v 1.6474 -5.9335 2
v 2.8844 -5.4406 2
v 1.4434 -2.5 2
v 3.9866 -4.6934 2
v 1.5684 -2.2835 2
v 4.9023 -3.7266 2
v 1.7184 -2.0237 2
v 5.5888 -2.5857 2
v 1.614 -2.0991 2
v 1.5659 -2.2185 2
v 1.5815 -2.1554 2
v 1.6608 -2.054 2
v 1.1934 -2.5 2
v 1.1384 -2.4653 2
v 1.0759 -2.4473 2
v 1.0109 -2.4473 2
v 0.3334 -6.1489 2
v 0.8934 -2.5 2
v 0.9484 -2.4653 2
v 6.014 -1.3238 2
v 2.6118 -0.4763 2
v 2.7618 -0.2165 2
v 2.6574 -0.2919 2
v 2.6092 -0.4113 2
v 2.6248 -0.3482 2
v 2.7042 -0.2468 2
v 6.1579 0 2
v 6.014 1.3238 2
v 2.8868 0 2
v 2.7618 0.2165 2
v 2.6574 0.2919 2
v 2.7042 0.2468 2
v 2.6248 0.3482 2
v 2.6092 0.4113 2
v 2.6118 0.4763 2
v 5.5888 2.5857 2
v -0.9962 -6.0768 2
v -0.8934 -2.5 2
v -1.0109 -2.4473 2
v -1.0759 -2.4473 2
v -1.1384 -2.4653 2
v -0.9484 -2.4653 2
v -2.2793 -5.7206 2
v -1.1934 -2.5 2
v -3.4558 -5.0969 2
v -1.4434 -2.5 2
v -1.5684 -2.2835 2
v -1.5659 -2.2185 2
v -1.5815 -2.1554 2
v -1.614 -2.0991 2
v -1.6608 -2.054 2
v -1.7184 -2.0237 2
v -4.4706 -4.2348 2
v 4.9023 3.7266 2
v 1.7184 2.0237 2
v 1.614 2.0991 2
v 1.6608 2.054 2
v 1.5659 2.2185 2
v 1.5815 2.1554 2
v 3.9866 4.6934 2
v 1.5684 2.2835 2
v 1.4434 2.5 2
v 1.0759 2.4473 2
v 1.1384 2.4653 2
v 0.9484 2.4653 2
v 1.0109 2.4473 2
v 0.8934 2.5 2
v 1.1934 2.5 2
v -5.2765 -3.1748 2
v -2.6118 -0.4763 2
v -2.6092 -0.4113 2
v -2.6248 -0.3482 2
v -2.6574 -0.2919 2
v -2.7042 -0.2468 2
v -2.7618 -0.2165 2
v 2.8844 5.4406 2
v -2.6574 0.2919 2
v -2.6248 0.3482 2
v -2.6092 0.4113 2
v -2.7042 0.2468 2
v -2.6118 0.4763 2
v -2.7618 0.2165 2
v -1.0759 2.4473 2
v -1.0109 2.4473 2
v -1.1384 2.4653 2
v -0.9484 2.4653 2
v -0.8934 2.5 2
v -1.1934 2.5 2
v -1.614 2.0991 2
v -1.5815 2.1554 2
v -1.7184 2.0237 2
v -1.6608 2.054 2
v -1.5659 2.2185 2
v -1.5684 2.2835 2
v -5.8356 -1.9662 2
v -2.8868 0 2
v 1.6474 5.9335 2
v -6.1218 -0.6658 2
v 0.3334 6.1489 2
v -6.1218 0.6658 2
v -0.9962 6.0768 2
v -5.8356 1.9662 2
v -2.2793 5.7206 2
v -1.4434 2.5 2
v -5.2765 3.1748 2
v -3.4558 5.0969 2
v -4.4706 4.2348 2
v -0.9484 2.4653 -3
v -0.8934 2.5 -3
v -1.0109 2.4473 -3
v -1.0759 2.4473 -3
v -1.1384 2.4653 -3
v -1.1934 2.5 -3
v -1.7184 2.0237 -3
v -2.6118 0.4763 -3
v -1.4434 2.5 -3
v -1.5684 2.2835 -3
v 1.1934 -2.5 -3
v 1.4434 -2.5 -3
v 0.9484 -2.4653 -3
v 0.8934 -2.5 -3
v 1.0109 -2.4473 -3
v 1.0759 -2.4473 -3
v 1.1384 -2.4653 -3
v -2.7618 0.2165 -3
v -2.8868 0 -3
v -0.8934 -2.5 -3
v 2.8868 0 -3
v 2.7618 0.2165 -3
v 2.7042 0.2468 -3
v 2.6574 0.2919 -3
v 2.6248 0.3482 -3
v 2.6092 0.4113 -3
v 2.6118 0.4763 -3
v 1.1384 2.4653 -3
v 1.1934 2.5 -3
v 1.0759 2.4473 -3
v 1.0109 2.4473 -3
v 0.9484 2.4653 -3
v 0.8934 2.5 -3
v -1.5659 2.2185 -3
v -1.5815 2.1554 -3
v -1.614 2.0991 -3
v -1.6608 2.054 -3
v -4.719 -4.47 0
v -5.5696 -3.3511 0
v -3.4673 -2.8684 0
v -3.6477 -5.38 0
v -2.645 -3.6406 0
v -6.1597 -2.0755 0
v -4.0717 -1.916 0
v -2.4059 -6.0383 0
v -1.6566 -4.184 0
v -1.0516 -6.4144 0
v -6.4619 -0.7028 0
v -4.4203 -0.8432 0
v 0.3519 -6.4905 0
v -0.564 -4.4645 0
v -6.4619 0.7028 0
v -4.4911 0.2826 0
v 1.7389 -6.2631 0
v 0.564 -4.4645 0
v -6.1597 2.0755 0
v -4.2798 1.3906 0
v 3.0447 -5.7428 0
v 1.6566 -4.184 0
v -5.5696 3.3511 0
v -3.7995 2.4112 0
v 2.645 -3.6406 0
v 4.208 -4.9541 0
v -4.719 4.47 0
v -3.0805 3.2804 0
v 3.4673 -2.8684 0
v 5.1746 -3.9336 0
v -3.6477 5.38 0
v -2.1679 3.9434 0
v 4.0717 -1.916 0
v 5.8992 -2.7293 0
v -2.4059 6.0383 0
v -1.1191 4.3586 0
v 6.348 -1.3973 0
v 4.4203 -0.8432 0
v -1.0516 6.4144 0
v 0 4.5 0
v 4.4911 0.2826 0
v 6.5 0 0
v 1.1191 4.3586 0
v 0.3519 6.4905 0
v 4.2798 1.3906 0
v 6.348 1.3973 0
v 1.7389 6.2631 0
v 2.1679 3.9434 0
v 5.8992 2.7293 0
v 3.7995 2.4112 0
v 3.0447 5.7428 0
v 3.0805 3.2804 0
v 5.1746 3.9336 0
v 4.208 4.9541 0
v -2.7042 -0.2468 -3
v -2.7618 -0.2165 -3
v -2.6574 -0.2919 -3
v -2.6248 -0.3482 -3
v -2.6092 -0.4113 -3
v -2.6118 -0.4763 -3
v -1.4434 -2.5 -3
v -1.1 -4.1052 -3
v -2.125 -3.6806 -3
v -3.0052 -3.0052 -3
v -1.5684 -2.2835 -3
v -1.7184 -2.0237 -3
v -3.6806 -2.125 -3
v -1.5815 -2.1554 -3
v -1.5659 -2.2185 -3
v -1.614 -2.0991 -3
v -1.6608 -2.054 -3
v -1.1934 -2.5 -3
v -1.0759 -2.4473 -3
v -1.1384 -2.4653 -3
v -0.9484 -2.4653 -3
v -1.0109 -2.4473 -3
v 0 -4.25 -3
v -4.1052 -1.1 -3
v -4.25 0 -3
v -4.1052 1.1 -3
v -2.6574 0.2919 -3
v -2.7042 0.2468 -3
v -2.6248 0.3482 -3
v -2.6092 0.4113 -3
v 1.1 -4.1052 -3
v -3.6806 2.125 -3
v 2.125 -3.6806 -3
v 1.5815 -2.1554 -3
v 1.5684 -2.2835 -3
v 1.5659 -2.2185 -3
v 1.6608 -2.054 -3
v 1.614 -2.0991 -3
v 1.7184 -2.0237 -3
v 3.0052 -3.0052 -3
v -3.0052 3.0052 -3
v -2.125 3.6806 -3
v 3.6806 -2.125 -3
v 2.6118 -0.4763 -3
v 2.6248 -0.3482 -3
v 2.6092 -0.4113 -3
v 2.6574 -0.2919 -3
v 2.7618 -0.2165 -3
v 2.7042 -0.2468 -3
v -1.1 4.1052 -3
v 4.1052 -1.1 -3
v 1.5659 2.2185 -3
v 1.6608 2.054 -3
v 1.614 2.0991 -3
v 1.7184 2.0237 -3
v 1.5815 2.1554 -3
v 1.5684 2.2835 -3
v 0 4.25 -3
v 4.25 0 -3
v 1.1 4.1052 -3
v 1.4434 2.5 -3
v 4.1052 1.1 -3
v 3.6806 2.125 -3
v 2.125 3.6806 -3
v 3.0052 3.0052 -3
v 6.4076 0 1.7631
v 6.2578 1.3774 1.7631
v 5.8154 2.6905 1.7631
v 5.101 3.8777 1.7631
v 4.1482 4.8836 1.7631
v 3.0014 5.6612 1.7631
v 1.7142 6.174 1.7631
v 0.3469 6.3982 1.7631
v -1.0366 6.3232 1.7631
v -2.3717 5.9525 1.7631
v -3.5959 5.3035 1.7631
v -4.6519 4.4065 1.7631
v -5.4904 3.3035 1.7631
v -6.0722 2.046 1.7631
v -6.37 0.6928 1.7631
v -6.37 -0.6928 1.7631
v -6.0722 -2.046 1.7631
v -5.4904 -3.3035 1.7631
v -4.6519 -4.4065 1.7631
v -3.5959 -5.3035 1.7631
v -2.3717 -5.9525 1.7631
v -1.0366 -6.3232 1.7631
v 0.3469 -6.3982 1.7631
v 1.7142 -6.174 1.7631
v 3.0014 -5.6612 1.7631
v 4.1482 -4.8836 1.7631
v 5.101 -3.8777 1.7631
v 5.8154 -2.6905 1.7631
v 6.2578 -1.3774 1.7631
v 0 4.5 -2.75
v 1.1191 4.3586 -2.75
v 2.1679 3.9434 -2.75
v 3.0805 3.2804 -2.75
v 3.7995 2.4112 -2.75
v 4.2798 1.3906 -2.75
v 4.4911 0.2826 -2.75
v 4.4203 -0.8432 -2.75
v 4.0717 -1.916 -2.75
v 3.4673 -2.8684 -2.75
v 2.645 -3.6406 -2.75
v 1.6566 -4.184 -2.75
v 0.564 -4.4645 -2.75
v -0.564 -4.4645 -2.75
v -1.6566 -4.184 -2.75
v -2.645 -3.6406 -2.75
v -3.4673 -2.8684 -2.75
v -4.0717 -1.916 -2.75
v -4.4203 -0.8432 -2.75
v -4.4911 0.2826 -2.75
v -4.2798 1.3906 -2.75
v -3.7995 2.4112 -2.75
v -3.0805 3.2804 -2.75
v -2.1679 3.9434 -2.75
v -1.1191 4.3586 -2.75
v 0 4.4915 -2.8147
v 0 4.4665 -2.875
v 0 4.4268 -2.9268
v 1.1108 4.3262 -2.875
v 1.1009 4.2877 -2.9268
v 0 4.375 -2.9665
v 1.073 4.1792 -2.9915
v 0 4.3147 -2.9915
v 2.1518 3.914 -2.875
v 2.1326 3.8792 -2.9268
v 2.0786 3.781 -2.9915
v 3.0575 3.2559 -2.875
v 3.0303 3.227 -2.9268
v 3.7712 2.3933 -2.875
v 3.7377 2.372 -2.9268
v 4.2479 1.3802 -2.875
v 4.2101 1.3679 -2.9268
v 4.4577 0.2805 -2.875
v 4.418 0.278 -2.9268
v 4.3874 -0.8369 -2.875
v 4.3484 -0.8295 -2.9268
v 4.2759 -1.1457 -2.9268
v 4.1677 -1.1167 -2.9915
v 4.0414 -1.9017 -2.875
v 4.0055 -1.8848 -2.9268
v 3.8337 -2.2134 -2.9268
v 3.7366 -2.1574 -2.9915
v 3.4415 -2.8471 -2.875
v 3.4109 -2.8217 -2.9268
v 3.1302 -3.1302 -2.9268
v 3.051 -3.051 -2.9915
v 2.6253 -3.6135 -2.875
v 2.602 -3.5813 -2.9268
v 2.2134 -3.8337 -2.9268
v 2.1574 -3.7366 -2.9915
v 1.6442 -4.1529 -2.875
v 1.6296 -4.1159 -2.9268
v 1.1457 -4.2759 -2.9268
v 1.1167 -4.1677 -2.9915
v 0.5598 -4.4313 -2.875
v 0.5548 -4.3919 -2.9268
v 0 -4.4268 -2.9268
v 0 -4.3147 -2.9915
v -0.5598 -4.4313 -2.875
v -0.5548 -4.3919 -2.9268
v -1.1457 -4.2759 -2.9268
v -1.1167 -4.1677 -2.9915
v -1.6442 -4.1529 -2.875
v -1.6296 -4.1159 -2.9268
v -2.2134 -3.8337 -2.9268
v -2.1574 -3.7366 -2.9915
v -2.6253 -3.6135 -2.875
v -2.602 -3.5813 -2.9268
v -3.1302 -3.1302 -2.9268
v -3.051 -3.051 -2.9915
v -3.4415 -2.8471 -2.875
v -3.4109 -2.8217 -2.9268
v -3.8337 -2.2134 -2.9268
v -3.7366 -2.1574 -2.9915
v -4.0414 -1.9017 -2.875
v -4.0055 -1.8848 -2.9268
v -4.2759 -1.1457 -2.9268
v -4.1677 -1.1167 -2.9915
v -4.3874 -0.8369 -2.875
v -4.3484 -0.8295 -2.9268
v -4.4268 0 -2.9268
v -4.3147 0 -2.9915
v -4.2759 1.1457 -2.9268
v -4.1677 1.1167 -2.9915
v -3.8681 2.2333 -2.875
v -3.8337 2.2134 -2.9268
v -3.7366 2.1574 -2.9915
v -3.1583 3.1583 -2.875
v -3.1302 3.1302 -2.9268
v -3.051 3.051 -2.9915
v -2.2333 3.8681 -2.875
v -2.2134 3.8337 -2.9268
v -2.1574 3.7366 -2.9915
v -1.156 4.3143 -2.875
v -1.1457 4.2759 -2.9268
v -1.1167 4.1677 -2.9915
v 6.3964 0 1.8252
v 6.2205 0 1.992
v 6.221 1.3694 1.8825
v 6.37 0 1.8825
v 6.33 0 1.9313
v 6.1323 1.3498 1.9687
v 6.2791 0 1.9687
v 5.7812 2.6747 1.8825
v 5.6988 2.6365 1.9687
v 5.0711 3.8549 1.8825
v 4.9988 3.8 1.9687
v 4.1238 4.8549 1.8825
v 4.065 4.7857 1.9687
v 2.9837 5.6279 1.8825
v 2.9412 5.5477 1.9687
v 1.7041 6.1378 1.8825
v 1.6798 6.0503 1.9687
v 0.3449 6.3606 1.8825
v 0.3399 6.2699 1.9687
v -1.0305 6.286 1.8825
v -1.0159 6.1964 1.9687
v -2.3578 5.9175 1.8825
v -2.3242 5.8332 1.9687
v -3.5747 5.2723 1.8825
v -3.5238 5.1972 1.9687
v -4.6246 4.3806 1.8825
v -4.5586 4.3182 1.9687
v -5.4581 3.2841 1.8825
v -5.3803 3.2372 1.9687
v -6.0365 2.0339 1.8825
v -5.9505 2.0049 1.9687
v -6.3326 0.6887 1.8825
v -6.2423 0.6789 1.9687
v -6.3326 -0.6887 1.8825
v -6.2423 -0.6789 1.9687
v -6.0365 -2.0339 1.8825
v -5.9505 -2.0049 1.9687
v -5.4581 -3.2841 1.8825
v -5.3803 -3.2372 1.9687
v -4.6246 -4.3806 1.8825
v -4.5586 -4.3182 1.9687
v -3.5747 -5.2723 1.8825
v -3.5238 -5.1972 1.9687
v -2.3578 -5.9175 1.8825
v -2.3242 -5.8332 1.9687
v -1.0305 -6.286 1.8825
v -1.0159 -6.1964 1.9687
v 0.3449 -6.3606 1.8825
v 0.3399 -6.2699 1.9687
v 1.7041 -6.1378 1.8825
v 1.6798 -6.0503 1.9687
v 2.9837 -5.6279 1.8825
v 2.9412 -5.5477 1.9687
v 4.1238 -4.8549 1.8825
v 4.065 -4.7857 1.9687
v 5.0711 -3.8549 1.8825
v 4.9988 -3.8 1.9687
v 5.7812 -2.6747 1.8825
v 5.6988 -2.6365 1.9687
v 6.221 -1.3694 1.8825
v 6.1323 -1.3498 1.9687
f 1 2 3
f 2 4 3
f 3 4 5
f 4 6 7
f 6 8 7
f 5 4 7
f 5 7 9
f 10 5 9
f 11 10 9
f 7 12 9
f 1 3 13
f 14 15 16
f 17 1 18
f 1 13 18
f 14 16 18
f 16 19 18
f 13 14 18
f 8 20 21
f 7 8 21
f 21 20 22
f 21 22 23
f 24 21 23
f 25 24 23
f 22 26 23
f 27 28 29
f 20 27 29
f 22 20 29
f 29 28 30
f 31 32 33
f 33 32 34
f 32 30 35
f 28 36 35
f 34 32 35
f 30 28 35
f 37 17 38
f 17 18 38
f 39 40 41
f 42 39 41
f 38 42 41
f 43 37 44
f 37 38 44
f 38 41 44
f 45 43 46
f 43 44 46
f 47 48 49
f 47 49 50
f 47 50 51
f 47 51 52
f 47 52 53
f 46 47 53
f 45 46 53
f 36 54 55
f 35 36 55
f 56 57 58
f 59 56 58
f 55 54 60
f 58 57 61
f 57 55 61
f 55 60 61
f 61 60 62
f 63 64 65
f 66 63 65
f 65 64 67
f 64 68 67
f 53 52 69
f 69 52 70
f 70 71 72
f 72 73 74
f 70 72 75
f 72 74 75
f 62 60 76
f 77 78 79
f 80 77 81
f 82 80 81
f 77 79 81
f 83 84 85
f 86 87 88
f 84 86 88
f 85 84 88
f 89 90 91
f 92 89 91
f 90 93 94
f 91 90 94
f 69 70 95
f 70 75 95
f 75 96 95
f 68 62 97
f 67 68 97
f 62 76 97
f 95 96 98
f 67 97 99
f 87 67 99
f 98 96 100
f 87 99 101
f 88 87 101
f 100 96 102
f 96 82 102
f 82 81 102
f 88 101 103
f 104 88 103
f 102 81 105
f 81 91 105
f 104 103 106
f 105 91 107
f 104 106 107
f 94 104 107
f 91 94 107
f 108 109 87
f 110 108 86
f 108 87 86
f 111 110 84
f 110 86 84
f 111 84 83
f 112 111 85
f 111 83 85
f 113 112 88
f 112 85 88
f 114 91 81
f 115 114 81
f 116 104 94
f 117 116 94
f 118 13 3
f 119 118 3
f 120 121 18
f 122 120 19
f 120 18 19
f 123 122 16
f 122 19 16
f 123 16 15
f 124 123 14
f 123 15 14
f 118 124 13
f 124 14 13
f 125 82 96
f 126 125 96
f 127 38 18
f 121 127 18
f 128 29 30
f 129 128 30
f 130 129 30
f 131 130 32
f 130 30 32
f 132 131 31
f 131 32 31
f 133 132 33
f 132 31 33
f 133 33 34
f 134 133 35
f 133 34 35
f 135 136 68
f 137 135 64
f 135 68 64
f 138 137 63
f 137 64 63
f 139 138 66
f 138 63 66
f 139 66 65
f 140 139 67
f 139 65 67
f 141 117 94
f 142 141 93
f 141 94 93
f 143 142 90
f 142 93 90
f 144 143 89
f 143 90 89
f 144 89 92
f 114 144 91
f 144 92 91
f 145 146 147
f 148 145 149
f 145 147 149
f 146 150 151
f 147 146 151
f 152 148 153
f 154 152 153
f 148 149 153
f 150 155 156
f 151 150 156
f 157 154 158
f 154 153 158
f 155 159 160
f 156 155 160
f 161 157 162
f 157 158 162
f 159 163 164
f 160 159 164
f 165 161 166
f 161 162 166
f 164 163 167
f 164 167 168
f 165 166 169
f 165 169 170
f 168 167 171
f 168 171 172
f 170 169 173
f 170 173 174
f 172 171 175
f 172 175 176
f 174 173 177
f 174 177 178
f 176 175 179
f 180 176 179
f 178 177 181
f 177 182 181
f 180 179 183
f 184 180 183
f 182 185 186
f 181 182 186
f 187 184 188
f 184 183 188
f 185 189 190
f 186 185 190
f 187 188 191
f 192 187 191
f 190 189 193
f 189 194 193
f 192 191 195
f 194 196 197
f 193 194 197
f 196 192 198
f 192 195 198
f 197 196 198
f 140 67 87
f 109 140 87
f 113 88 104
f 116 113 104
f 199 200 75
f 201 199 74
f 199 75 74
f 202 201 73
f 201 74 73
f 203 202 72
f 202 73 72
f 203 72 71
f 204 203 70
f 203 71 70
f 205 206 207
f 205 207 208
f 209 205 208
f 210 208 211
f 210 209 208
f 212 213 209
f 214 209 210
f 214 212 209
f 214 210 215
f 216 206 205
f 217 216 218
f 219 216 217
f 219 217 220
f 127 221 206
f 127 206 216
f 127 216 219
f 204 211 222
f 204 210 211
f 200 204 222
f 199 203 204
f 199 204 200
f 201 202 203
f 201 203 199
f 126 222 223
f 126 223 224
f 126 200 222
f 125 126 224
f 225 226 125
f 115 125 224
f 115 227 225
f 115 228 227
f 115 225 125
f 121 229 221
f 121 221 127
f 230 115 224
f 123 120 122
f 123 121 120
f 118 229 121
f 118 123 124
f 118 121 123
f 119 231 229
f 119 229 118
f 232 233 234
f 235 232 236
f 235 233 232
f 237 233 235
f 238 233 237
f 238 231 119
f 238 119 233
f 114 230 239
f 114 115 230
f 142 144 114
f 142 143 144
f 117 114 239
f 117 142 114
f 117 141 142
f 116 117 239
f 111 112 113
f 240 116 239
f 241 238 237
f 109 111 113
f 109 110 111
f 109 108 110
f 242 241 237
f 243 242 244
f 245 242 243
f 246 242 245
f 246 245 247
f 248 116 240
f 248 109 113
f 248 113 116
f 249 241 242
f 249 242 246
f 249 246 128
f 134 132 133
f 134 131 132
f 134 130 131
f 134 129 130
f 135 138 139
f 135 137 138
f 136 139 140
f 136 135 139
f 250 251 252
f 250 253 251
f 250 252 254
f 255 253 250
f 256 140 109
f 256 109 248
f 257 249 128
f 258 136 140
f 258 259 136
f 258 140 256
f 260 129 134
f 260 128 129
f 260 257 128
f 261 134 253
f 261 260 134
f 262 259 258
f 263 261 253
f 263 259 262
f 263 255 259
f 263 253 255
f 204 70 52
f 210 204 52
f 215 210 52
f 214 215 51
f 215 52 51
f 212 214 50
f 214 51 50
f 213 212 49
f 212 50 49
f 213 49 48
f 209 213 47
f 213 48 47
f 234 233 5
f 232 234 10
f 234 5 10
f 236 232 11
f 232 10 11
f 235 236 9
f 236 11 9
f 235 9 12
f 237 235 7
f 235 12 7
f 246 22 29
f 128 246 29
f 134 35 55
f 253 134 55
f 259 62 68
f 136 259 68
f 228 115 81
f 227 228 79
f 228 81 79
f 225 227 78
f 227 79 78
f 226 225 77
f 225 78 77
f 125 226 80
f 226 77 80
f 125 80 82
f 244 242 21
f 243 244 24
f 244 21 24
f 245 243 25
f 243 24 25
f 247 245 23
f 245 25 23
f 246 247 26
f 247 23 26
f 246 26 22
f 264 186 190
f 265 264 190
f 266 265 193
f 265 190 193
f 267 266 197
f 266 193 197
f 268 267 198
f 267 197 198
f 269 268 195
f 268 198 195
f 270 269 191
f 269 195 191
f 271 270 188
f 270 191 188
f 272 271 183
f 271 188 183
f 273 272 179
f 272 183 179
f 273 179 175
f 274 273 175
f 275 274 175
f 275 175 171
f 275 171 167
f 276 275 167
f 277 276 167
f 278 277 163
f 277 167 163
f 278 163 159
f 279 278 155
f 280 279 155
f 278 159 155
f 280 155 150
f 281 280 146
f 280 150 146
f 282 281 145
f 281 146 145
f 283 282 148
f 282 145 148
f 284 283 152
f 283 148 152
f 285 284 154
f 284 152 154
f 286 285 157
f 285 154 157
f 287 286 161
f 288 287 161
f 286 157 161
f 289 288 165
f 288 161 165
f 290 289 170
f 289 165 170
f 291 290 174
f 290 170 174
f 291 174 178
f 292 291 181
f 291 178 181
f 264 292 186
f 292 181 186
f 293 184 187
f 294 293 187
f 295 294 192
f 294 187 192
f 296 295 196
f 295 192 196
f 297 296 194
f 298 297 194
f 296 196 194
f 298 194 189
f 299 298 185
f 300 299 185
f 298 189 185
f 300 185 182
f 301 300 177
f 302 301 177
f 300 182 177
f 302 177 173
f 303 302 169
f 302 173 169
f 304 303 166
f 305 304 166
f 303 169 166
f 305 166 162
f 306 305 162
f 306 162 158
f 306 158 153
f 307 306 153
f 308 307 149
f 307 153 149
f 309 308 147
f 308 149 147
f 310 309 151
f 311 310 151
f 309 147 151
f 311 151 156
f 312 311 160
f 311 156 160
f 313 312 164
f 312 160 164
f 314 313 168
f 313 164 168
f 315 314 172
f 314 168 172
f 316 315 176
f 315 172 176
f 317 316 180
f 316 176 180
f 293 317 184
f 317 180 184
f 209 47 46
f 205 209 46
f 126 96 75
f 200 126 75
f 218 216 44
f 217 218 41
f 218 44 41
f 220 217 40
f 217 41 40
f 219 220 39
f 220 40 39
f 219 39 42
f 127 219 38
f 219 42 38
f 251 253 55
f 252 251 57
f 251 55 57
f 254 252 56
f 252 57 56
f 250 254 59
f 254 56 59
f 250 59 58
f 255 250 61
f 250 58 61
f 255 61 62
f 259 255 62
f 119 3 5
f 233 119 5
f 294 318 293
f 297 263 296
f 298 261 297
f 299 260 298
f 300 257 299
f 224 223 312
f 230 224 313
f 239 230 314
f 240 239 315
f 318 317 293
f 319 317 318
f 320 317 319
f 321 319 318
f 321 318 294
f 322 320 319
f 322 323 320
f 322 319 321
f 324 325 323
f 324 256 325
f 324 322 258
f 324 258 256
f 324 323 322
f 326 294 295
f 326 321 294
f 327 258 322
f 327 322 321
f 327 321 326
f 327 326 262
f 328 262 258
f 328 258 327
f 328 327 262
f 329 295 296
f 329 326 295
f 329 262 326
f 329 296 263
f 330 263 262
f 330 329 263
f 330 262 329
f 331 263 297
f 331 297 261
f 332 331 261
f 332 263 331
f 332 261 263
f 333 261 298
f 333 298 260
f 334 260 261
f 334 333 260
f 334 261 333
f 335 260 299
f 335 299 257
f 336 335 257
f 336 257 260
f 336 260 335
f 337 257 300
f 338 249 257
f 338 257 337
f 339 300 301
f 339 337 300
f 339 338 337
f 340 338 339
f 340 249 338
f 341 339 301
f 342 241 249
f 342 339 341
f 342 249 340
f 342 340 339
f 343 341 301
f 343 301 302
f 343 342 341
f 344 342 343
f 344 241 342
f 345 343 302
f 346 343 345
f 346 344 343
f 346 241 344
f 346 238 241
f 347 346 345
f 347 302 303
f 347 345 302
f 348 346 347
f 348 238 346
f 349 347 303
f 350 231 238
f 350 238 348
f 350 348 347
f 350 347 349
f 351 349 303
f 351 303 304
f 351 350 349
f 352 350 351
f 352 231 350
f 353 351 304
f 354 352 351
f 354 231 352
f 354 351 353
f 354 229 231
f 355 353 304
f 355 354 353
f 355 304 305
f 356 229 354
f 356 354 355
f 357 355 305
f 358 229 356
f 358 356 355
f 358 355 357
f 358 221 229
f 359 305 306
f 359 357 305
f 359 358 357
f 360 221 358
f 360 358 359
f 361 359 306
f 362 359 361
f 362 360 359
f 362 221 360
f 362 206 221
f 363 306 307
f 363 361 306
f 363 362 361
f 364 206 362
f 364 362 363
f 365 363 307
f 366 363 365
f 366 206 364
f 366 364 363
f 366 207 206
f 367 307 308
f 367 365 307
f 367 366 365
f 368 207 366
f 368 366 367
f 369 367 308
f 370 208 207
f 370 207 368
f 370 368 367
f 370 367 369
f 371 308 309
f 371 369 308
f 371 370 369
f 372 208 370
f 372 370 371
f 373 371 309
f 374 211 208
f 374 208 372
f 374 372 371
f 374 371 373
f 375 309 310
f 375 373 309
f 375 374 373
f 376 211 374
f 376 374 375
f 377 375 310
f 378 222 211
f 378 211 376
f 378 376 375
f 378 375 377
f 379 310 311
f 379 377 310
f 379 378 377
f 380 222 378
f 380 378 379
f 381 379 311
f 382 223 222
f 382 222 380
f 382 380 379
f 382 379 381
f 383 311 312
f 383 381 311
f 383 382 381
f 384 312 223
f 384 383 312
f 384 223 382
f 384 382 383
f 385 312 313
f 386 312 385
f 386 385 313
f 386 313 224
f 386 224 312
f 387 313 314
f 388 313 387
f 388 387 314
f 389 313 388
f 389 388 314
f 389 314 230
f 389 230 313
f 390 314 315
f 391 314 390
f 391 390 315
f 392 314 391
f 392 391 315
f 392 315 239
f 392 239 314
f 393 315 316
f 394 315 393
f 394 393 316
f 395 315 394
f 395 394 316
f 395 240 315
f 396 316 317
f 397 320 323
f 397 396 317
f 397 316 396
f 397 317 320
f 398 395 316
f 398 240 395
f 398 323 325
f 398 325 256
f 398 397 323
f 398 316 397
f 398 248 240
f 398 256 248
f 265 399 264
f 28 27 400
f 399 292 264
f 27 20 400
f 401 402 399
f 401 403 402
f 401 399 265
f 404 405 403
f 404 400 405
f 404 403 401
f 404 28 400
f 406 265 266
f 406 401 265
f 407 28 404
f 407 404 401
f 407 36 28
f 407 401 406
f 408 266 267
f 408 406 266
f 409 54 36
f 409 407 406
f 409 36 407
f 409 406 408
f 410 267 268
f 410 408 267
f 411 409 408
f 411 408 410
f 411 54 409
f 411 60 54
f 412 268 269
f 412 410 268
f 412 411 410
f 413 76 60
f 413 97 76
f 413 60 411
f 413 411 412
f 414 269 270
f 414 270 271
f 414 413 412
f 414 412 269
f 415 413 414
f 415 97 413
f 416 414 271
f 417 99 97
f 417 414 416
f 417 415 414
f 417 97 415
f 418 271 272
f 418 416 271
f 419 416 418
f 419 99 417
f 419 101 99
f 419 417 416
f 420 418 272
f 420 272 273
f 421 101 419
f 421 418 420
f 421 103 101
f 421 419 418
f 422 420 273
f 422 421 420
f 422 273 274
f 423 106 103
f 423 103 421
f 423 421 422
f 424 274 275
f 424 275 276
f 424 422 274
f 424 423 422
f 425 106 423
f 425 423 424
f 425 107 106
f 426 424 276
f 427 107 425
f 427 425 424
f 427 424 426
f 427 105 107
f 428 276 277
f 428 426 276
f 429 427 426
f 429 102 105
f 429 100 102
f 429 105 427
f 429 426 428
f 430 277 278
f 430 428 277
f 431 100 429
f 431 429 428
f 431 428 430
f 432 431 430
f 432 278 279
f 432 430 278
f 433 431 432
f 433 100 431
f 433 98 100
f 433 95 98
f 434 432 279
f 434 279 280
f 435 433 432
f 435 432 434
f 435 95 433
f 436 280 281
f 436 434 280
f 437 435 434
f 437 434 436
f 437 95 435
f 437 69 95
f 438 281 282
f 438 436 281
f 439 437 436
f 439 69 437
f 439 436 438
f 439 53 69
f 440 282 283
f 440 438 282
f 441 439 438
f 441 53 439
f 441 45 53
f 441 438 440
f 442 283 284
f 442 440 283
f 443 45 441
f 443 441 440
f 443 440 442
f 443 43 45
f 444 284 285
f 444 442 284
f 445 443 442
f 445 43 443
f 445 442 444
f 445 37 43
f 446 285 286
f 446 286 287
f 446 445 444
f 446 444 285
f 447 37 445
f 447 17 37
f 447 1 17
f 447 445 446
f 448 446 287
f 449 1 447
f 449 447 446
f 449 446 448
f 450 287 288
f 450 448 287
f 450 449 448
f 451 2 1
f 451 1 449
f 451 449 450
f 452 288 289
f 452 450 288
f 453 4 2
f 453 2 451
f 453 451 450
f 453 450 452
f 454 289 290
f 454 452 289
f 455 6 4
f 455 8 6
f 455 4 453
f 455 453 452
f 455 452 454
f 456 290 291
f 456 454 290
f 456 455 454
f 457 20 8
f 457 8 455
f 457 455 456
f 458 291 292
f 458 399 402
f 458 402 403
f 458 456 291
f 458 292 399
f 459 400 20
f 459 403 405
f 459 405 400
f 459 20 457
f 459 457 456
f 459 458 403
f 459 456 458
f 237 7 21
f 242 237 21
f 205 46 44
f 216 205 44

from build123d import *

# Parameters (mm, degrees)
SKETCH2_R           = 4.5
BOSS_EXTRUDE1_DEPTH = 3
CUT_EXTRUDE1_DEPTH  = 11.464224768
FILLET1_R           = 0.25


with BuildPart() as part:
    # Sketch1 → Revolve1 (revolve)
    with BuildSketch(Plane(origin=(0, 0, 0), x_dir=(1, 0, 0), z_dir=(0, 1, 0))):
        Polygon((6.5, 0), (0, 0), (0, -2), (6.395184442, -2), align=None)
    revolve(axis=Axis((0, 0, 0), (0, 0, 1)))

    # Sketch2 → Boss-Extrude1 (add)
    with BuildSketch(Plane(origin=(0, 0, 0), x_dir=(-1, 0, 0), z_dir=(0, 0, -1))):
        with Locations(Location((0, 0, 0), (0, 0, 90))):
            Circle(SKETCH2_R)
    extrude(amount=BOSS_EXTRUDE1_DEPTH)

    # Sketch3 → Cut-Extrude1 (cut, through all)
    with BuildSketch(Plane.XY.offset(2)):
        with BuildLine():
            Line((1.568375673, 2.283493649), (1.443375673, 2.5))
            Line((1.443375673, 2.5), (1.193375673, 2.5))
            ThreePointArc((1.193375673, 2.5), (1.043375673, 2.445), (0.893375673, 2.5))
            Line((0.893375673, 2.5), (-0.893375673, 2.5))
            ThreePointArc((-0.893375673, 2.5), (-1.043375673, 2.445), (-1.193375673, 2.5))
            Line((-1.193375673, 2.5), (-1.443375673, 2.5))
            Line((-1.443375673, 2.5), (-1.568375673, 2.283493649))
            ThreePointArc((-1.568375673, 2.283493649), (-1.595744276, 2.126089838), (-1.718375673, 2.023686028))
            Line((-1.718375673, 2.023686028), (-2.611751346, 0.476313972))
            ThreePointArc((-2.611751346, 0.476313972), (-2.639119949, 0.318910162), (-2.761751346, 0.216506351))
            Line((-2.761751346, 0.216506351), (-2.886751346, 0))
            Line((-2.886751346, 0), (-2.761751346, -0.216506351))
            ThreePointArc((-2.761751346, -0.216506351), (-2.639119949, -0.318910162), (-2.611751346, -0.476313972))
            Line((-2.611751346, -0.476313972), (-1.718375673, -2.023686028))
            ThreePointArc((-1.718375673, -2.023686028), (-1.595744276, -2.126089838), (-1.568375673, -2.283493649))
            Line((-1.568375673, -2.283493649), (-1.443375673, -2.5))
            Line((-1.443375673, -2.5), (-1.193375673, -2.5))
            ThreePointArc((-1.193375673, -2.5), (-1.043375673, -2.445), (-0.893375673, -2.5))
            Line((-0.893375673, -2.5), (0.893375673, -2.5))
            ThreePointArc((0.893375673, -2.5), (1.043375673, -2.445), (1.193375673, -2.5))
            Line((1.193375673, -2.5), (1.443375673, -2.5))
            Line((1.443375673, -2.5), (1.568375673, -2.283493649))
            ThreePointArc((1.568375673, -2.283493649), (1.595744276, -2.126089838), (1.718375673, -2.023686028))
            Line((1.718375673, -2.023686028), (2.611751346, -0.476313972))
            ThreePointArc((2.611751346, -0.476313972), (2.639119949, -0.318910162), (2.761751346, -0.216506351))
            Line((2.761751346, -0.216506351), (2.886751346, 0))
            Line((2.886751346, 0), (2.761751346, 0.216506351))
            ThreePointArc((2.761751346, 0.216506351), (2.639119949, 0.318910162), (2.611751346, 0.476313972))
            Line((2.611751346, 0.476313972), (1.718375673, 2.023686028))
            ThreePointArc((1.718375673, 2.023686028), (1.595744276, 2.126089838), (1.568375673, 2.283493649))
        make_face()
    extrude(amount=-CUT_EXTRUDE1_DEPTH, mode=Mode.SUBTRACT)

    # Fillet1
    fillet1_edges = [part.edges().sort_by_distance(p)[0] for p in [
        (-6.395184442, 0, 2),
        (0, -4.5, -3),
    ]]
    fillet(fillet1_edges, radius=FILLET1_R)


solid = part.part
